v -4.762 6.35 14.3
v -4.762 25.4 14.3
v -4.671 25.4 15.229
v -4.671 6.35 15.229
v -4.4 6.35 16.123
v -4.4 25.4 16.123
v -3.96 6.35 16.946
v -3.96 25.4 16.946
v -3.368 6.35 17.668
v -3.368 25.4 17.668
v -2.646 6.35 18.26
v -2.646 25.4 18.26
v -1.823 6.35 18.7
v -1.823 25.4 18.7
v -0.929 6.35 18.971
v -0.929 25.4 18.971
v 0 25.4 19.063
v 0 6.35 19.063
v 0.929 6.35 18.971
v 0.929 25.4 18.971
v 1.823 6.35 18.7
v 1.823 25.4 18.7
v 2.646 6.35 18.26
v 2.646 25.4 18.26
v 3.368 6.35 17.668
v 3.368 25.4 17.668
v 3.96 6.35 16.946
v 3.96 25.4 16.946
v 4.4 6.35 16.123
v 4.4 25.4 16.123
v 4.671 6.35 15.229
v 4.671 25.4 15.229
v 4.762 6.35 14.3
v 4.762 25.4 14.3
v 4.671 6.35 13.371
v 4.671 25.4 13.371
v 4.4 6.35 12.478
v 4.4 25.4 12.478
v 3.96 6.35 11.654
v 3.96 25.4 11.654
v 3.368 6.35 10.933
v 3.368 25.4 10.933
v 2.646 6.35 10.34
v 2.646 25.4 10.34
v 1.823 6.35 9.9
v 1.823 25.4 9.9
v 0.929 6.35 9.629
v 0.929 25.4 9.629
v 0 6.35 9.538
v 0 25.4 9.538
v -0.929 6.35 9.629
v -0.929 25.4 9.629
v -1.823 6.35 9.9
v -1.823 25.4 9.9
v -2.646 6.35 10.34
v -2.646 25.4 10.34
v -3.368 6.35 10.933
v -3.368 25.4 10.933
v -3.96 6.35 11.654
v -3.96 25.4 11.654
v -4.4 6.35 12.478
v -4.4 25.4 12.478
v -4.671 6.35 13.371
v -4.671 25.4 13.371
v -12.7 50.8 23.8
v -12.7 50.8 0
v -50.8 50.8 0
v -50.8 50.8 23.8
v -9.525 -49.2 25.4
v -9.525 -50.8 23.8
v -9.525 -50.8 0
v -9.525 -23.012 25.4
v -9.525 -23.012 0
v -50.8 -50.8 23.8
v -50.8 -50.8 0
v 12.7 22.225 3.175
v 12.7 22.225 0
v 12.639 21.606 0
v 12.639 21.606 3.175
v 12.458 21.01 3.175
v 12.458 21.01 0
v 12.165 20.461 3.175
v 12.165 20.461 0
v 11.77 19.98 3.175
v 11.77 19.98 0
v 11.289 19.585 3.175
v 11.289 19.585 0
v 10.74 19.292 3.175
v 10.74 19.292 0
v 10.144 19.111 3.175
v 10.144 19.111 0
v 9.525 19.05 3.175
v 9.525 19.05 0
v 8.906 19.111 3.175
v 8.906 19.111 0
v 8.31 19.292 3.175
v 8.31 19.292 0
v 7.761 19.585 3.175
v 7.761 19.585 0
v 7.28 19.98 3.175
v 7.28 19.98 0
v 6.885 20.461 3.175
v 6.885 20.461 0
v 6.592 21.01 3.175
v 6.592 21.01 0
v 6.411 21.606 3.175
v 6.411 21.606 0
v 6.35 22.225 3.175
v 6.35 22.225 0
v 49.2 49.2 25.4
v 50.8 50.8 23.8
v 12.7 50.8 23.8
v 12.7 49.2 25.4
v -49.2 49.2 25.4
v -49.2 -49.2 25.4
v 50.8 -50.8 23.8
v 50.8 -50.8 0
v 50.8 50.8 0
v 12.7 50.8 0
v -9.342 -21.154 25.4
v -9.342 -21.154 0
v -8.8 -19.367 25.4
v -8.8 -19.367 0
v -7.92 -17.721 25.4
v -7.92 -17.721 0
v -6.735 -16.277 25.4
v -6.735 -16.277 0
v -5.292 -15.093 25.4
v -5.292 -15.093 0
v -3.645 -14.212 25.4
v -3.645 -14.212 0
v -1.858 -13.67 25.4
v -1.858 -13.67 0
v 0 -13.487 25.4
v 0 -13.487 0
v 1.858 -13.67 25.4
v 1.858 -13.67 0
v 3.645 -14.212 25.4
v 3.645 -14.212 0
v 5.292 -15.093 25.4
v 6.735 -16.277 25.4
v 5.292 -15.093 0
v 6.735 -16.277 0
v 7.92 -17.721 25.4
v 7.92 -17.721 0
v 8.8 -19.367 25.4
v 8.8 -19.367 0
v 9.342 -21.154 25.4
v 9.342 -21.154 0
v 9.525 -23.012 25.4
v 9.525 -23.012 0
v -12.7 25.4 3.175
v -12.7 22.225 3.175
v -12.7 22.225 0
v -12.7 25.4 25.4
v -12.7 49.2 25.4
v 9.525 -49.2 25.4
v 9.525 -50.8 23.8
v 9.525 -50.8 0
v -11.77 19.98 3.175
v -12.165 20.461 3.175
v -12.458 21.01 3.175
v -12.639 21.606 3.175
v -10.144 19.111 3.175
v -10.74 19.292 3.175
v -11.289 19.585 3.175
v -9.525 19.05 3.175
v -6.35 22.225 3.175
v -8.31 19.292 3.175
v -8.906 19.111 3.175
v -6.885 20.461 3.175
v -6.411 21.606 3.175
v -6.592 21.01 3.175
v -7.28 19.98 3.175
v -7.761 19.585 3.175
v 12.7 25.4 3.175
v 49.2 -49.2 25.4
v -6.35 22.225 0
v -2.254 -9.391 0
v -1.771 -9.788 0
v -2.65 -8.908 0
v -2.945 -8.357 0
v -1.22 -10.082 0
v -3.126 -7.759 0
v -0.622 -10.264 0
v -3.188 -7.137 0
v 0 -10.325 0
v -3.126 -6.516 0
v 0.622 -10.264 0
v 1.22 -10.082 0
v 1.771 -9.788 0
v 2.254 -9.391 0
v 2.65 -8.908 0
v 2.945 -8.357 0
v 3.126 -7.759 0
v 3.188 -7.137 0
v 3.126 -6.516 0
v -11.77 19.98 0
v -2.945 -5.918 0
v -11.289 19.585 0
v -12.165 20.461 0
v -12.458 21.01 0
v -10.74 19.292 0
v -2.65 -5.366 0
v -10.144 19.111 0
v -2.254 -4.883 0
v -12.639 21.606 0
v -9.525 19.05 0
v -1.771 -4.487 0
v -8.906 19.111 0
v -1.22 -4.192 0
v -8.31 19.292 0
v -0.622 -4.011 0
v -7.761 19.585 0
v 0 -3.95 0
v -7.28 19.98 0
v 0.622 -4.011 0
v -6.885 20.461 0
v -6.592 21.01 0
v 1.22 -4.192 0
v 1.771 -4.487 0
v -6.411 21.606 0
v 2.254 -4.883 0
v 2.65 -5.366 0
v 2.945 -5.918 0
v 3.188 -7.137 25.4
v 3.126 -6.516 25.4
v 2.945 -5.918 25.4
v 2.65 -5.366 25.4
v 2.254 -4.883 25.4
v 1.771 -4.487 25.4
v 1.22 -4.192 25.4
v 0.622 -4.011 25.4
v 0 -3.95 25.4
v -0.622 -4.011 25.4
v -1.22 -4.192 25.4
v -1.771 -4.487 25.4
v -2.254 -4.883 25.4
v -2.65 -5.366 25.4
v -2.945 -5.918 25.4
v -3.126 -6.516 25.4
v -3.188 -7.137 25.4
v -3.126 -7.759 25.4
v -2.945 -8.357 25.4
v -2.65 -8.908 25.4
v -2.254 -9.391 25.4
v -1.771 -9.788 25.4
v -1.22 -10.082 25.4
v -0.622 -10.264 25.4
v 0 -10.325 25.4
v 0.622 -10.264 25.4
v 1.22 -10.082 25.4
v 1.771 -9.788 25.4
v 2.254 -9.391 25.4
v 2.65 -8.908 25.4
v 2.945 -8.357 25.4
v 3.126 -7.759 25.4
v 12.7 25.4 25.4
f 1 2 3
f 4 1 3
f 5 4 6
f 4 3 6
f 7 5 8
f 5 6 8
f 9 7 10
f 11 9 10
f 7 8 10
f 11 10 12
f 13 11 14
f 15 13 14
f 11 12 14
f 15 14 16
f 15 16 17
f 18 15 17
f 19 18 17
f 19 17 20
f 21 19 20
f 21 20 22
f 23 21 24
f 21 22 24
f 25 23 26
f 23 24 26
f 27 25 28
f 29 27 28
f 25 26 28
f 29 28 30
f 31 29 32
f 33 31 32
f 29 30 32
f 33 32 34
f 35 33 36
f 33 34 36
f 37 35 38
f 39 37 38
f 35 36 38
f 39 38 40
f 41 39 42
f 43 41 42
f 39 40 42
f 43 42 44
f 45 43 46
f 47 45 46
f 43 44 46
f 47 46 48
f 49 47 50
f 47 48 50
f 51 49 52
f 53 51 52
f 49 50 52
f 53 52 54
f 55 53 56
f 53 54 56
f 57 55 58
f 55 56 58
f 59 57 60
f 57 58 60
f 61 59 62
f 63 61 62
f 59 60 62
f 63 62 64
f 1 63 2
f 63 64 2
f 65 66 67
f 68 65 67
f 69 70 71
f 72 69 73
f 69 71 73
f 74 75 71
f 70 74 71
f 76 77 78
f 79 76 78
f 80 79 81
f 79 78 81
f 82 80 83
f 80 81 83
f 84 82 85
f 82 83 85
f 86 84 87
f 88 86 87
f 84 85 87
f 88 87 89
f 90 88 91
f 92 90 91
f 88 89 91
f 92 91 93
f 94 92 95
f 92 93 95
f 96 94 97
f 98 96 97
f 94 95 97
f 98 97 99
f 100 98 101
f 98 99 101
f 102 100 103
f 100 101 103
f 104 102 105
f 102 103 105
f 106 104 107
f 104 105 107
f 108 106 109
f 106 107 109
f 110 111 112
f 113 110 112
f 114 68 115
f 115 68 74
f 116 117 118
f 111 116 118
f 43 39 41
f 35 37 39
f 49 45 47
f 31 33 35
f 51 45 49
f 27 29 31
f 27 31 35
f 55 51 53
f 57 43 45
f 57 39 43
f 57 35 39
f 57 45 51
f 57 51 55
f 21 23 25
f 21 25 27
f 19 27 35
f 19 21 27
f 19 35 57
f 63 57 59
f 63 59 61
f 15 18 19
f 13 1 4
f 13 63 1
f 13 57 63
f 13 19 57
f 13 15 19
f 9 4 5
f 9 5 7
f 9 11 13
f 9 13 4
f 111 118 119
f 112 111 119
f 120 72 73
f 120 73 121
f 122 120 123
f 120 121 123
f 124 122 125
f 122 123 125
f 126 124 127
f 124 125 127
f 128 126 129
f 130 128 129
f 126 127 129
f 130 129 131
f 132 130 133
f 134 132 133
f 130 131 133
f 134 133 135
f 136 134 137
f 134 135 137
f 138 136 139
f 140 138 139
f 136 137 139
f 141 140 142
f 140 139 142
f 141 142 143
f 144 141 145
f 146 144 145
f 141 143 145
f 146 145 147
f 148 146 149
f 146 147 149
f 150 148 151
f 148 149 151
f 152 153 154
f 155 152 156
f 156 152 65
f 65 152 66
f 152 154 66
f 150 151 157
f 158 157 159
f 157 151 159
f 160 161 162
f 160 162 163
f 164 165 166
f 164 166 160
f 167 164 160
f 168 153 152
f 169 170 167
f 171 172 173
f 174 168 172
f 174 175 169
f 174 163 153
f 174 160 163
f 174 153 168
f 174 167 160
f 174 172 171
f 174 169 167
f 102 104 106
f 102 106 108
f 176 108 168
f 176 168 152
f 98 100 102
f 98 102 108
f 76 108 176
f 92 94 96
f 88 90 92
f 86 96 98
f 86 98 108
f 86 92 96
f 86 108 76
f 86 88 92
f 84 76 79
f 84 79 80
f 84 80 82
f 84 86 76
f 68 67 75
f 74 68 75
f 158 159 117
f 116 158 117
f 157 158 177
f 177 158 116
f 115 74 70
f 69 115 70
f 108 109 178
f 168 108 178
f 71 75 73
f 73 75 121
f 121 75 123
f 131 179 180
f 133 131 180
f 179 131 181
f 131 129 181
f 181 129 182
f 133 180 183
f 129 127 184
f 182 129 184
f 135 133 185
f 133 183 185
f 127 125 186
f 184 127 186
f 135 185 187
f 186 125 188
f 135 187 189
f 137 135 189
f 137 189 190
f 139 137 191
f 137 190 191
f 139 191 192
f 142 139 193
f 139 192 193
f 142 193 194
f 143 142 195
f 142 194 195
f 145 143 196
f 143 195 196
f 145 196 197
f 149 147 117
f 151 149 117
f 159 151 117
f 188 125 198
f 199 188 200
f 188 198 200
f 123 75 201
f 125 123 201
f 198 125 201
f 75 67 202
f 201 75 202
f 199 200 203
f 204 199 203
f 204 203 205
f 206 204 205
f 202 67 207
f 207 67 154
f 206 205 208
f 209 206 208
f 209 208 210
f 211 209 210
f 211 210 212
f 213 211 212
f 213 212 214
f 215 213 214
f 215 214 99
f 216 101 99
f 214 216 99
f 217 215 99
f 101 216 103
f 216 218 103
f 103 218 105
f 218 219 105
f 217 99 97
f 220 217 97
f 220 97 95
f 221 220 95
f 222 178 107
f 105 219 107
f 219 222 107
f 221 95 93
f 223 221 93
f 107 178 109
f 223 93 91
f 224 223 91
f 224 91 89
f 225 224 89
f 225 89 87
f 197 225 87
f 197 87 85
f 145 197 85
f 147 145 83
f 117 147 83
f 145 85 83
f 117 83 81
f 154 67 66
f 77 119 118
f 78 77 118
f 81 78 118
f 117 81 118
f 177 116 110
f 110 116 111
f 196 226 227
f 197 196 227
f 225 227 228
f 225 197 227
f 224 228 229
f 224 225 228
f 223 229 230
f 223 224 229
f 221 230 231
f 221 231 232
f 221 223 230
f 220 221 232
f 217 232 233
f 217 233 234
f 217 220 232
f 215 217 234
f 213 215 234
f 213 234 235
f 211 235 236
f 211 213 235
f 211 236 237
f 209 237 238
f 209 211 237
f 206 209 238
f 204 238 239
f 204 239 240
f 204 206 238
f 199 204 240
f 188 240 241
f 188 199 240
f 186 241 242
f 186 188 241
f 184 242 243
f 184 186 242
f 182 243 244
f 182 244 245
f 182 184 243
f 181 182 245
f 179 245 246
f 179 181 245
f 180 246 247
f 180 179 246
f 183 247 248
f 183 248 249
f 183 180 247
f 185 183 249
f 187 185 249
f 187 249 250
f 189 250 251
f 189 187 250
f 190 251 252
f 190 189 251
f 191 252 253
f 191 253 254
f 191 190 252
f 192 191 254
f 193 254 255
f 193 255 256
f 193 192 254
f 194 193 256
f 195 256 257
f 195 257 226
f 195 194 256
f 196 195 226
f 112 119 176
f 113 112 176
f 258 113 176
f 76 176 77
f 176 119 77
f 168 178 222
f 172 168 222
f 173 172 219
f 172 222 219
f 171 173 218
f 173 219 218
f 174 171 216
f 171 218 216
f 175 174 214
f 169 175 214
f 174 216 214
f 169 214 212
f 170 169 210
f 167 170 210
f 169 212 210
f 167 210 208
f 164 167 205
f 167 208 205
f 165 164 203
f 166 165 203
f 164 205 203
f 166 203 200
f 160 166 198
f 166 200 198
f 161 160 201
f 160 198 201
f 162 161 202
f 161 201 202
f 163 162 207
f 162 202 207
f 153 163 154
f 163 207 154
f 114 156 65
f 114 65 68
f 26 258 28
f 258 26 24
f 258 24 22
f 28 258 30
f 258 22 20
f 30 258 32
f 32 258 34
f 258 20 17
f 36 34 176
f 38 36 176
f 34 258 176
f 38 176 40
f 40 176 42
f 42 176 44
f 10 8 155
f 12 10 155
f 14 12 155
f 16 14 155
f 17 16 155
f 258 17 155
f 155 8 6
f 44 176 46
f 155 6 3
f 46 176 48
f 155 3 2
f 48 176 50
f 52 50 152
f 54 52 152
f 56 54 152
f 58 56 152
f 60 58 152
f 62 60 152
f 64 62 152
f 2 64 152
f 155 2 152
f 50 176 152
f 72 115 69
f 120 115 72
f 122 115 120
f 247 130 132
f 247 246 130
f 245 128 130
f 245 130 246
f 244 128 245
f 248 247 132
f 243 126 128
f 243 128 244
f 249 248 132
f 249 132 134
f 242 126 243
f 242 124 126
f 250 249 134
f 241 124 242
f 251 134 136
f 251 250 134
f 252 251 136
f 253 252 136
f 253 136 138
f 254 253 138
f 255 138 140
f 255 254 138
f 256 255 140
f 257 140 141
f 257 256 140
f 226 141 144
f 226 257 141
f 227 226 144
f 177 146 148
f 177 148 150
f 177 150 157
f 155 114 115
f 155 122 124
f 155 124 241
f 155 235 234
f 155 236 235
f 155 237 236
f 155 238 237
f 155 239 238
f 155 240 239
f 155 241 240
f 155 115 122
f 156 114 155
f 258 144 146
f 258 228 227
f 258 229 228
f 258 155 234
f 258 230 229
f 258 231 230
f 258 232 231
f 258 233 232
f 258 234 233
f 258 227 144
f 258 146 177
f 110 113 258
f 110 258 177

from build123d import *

# Parameters (mm, degrees)
F0_R     = 3.1877
F1_DEPTH = 25.4
F3_DEPTH = 3.175
F4_SIZE  = 1.6002
F5_R     = 4.7625
F6_DEPTH = 19.05


with BuildPart() as f1:
    # F0 (on Top) → F1 (new body)
    with BuildSketch(Plane.XY):
        with BuildLine():
            Line((-12.7, 50.8), (-50.8, 50.8))
            Line((-50.8, 50.8), (-50.8, -50.8))
            Line((-50.8, -50.8), (-9.525, -50.8))
            Line((-9.525, -50.8), (-9.525, -23.0124))
            ThreePointArc((-9.525, -23.0124), (0, -13.4874), (9.525, -23.0124))
            Line((9.525, -23.0124), (9.525, -50.8))
            Line((9.525, -50.8), (50.8, -50.8))
            Line((50.8, -50.8), (50.8, 50.8))
            Line((50.8, 50.8), (12.7, 50.8))
            Line((12.7, 50.8), (12.7, 25.4))
            Line((12.7, 25.4), (-12.7, 25.4))
            Line((-12.7, 25.4), (-12.7, 50.8))
        make_face()
        with Locations((0, -7.1374)):
            Circle(F0_R, mode=Mode.SUBTRACT)
    extrude(amount=F1_DEPTH)

    # F2 (on face) → F3 (cut)
    with BuildSketch(Plane(origin=(0, 0, 0), x_dir=(1, 0, 0), z_dir=(0, 0, -1))):
        with BuildLine():
            Line((-12.7, -22.225), (-12.7, -25.4))
            Line((-12.7, -25.4), (12.7, -25.4))
            Line((12.7, -25.4), (12.7, -22.225))
            ThreePointArc((12.7, -22.225), (9.525, -19.05), (6.35, -22.225))
            Line((6.35, -22.225), (-6.35, -22.225))
            ThreePointArc((-6.35, -22.225), (-9.525, -19.05), (-12.7, -22.225))
        make_face()
    extrude(amount=-F3_DEPTH, mode=Mode.SUBTRACT)

    # F4
    f4_edges = [f1.edges().sort_by_distance(p)[0] for p in [
        (-50.8, 0, 25.4),
        (-30.1625, -50.8, 25.4),
        (30.1625, -50.8, 25.4),
        (50.8, 0, 25.4),
        (31.75, 50.8, 25.4),
        (-31.75, 50.8, 25.4),
    ]]
    chamfer(f4_edges, length=F4_SIZE)

    # F5 (on face) → F6 (cut)
    with BuildSketch(Plane(origin=(0, 25.4, 0), x_dir=(-1, 0, 0), z_dir=(0, 1, 0))):
        with Locations((0, 14.3002)):
            Circle(F5_R)
    extrude(amount=-F6_DEPTH, mode=Mode.SUBTRACT)


solid = f1.part
